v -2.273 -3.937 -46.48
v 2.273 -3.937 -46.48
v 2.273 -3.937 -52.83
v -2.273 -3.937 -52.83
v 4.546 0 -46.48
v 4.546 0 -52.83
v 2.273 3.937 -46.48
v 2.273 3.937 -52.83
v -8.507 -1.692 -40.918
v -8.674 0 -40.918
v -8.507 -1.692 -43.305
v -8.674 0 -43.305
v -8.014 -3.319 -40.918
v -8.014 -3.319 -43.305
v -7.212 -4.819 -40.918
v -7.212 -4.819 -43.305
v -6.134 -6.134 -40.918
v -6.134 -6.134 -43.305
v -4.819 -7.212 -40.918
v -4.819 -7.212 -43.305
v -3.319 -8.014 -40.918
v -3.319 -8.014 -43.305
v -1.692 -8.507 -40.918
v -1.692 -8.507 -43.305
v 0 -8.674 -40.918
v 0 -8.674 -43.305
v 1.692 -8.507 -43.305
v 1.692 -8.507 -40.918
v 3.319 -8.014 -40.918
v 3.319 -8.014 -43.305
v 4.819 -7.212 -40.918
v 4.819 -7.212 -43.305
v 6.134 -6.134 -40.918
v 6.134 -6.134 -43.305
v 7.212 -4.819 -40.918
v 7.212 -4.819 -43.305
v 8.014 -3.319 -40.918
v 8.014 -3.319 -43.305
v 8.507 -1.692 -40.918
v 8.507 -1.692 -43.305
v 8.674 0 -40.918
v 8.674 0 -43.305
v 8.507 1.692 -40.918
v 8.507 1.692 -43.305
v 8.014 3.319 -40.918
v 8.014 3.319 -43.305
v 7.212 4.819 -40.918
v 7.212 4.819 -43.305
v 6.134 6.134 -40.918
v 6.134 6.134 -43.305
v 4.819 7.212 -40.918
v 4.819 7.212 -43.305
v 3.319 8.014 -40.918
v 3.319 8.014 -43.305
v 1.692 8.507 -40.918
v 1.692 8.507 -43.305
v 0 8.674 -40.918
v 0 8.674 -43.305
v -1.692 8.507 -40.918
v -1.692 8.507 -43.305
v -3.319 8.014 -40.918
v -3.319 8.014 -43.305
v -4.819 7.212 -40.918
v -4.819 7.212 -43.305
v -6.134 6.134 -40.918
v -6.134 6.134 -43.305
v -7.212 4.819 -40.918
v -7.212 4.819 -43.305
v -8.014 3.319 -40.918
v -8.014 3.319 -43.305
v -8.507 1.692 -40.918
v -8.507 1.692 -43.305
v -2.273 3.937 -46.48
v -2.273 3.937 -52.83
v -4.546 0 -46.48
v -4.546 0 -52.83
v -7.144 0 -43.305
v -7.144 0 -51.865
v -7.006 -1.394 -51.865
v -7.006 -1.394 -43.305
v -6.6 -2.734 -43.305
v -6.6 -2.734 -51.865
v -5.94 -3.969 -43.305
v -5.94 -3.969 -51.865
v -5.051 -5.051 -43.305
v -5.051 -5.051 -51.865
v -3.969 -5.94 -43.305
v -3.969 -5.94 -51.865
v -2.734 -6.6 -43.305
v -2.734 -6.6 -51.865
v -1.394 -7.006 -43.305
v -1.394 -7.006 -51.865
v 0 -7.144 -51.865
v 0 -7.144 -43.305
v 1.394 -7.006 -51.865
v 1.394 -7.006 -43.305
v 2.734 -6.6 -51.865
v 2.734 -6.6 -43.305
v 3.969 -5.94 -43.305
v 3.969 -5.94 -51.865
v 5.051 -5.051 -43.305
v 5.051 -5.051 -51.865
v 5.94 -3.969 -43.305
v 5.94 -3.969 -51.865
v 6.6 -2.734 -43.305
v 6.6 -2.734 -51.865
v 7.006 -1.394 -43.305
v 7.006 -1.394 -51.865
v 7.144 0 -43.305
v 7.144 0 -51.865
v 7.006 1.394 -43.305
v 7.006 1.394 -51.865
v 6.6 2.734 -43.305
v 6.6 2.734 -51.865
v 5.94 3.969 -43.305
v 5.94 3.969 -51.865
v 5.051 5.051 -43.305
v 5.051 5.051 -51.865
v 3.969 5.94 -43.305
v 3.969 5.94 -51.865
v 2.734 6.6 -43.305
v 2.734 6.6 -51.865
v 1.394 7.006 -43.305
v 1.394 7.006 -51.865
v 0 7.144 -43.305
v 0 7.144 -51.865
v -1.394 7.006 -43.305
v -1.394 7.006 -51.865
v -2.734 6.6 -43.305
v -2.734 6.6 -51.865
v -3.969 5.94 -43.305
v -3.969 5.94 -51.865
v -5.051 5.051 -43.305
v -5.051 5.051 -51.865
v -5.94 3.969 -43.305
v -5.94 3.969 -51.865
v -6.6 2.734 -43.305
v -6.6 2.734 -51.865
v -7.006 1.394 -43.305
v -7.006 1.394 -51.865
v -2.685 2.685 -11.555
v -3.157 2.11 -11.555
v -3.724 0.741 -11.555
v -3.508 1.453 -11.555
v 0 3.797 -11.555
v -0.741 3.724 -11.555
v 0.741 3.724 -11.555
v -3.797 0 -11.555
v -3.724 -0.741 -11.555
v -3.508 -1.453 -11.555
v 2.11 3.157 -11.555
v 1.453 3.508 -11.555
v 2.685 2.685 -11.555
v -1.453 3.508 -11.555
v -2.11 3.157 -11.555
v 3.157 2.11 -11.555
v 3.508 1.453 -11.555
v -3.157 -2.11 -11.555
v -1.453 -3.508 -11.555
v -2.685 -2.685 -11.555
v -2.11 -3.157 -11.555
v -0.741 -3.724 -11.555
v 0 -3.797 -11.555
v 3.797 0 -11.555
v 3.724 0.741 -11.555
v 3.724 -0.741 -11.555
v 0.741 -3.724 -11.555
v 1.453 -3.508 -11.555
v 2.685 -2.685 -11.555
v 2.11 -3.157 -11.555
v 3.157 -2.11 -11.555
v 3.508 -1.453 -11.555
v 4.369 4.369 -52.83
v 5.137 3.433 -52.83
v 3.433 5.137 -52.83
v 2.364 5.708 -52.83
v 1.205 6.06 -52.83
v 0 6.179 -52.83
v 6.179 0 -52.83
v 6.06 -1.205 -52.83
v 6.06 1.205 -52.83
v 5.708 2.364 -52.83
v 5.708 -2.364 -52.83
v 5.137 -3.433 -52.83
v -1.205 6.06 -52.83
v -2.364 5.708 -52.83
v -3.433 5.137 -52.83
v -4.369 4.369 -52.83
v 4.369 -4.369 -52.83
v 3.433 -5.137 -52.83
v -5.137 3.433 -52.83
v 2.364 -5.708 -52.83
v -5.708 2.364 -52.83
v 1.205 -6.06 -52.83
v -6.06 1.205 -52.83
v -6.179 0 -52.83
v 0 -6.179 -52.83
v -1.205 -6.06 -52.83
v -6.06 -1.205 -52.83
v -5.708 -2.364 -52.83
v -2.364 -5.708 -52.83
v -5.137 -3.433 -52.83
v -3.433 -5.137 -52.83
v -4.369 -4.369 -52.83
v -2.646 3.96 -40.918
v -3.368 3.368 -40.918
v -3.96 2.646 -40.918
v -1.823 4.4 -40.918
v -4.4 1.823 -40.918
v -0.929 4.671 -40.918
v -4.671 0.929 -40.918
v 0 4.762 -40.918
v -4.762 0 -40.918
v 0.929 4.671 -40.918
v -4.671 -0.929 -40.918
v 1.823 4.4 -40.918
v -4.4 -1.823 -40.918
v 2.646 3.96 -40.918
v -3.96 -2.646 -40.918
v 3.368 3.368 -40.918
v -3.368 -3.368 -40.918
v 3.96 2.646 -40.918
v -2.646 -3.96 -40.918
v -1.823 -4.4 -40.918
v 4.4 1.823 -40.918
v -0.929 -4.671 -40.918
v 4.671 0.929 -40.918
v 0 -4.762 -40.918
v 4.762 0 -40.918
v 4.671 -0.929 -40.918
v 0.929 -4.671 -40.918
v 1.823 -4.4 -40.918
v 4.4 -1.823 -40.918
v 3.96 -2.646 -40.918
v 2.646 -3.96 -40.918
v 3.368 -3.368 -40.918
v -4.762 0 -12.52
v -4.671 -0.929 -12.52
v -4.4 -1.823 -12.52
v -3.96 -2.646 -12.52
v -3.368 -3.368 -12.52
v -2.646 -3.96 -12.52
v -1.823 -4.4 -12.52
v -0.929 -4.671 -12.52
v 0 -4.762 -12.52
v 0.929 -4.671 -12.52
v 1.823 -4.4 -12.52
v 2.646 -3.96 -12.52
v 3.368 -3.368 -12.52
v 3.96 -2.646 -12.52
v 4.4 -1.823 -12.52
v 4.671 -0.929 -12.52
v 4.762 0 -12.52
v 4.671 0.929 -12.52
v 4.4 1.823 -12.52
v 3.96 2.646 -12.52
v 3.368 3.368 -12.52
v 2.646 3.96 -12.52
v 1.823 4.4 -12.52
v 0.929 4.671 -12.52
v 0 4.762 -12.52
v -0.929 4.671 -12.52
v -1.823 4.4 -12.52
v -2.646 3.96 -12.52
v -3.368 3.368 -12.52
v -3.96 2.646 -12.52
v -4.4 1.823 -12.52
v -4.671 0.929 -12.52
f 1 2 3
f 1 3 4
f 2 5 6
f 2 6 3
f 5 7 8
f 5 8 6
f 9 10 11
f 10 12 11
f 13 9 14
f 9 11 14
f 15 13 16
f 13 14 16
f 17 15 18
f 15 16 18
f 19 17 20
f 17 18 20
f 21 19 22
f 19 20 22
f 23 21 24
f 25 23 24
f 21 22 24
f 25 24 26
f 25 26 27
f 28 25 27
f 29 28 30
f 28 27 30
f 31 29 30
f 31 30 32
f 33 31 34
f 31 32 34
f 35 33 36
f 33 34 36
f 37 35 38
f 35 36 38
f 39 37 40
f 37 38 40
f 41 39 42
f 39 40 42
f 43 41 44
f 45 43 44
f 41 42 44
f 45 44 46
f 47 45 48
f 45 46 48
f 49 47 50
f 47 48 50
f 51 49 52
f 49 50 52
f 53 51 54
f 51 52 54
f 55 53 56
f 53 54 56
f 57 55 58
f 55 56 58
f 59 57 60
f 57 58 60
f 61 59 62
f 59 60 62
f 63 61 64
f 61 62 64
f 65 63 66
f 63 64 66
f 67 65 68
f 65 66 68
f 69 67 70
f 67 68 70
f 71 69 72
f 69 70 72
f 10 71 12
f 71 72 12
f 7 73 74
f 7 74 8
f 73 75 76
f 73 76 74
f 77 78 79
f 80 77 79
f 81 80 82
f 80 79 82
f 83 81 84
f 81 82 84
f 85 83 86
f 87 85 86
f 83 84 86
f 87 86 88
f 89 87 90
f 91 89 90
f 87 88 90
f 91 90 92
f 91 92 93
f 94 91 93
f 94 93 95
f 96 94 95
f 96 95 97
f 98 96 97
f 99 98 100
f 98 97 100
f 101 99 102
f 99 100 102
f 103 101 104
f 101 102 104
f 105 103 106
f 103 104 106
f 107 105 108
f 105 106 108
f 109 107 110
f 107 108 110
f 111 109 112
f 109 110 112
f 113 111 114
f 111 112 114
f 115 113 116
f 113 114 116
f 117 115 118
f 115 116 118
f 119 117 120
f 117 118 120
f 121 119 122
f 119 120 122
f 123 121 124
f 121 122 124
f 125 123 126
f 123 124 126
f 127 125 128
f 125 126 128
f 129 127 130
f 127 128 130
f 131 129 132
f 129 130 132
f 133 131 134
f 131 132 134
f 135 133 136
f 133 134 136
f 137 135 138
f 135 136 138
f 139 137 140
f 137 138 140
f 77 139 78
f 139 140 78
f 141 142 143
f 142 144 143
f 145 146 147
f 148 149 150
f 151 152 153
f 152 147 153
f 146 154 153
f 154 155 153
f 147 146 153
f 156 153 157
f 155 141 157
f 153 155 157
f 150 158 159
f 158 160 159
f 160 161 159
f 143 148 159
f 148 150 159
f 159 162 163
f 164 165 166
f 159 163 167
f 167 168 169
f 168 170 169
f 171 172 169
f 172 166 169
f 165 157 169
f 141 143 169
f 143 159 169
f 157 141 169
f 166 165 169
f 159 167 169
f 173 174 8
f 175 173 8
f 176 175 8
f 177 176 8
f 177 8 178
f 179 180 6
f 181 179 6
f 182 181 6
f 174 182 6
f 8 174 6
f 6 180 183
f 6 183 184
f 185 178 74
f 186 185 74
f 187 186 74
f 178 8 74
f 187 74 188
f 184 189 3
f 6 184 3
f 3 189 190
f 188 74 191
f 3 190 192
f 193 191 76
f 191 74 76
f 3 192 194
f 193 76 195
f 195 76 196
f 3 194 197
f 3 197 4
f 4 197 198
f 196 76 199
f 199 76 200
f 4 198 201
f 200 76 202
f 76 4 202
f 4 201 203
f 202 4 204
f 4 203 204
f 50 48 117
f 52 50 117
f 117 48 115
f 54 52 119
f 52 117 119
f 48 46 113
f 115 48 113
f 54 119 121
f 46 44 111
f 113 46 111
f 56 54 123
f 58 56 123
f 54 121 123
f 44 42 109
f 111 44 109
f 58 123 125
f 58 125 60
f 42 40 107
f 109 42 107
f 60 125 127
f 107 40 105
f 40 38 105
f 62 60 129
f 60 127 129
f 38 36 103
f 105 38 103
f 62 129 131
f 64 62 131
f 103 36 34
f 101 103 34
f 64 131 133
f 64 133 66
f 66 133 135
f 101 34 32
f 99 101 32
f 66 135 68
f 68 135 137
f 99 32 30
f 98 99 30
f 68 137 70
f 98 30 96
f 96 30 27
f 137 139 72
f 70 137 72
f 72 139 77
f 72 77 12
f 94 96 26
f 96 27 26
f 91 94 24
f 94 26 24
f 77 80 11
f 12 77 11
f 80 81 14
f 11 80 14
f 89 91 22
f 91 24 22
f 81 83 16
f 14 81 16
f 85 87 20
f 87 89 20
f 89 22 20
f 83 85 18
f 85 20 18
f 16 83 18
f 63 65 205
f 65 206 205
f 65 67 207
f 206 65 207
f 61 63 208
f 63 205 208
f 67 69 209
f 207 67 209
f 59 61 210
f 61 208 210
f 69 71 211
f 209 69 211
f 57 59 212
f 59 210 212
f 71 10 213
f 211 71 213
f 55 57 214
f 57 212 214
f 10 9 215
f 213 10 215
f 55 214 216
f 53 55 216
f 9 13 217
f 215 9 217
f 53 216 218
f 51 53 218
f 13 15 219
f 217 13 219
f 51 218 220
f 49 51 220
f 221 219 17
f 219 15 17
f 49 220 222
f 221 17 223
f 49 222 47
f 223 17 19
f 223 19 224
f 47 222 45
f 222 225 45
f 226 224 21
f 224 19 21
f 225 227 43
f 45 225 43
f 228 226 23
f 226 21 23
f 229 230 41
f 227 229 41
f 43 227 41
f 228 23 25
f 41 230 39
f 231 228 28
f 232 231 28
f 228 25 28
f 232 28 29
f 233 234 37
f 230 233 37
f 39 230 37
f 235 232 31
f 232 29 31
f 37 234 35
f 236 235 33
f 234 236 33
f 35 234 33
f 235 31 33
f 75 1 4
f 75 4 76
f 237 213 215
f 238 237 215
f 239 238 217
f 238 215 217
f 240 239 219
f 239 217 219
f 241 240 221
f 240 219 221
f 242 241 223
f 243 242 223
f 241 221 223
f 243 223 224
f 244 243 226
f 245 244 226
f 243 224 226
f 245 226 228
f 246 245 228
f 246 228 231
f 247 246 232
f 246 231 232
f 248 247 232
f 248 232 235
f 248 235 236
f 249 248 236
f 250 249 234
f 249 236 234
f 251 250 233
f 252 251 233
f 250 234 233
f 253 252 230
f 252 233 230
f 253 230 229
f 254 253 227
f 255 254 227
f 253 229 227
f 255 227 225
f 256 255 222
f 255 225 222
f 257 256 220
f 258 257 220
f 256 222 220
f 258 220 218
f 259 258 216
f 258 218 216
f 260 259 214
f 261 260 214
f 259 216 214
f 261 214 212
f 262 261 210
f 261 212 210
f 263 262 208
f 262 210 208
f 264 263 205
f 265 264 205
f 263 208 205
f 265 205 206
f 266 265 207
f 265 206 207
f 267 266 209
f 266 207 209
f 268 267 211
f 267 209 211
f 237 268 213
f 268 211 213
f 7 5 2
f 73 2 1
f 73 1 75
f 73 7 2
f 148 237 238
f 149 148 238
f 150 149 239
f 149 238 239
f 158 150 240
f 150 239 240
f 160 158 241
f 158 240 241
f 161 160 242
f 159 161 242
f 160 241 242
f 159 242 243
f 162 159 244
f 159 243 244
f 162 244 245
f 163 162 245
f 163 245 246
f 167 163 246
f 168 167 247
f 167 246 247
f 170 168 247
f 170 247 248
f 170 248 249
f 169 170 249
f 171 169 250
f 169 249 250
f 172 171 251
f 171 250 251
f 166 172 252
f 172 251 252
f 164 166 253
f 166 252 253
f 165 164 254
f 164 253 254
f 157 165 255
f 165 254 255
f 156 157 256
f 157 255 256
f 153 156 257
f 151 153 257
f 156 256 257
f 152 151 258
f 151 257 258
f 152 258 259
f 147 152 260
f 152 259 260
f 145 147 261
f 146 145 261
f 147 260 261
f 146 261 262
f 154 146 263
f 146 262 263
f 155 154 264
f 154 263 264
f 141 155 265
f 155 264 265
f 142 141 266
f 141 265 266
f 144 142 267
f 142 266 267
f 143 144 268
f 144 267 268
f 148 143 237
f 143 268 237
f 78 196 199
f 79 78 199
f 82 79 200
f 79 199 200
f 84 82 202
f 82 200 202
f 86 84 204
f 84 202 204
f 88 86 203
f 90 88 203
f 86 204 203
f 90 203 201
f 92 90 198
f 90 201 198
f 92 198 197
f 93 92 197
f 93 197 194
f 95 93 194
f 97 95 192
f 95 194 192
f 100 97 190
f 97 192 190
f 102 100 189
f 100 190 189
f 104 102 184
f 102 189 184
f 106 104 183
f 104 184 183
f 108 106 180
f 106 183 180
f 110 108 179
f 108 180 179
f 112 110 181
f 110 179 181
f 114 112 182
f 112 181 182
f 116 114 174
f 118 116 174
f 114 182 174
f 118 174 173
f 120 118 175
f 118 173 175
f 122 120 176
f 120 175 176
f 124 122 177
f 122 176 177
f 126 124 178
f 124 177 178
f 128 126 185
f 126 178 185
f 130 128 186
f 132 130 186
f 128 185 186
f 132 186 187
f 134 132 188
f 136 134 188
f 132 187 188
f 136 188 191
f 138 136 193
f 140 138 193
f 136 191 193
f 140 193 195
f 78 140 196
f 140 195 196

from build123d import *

# Parameters (mm, degrees)
CUT_EXTRUDE1_DEPTH = 6.35
CHAMFER1_SIZE      = 0.9652
CHAMFER2_SIZE      = 0.9652


with BuildPart() as part:
    # Sketch1 → Revolve1 (revolve)
    with BuildSketch(Plane(origin=(0, 0, 0), x_dir=(1, 0, 0), z_dir=(0, 1, 0))):
        Polygon((0, 52.830247514), (0, 11.555247514), (-4.7625, 11.555247514), (-4.7625, 40.917647514), (-8.6741, 40.917647514), (-8.6741, 43.305247514), (-7.14375, 43.305247514), (-7.14375, 52.830247514), align=None)
    revolve(axis=Axis((0, 0, -86.603340611), (0, 0, 1)))

    # Sketch2 → Cut-Extrude1 (cut)
    with BuildSketch(Plane(origin=(0, 0, -52.830247514), x_dir=(-1, 0, 0), z_dir=(0, 0, -1))):
        Polygon((2.27302801, 3.937), (-2.27302801, 3.937), (-4.54605602, 0), (-2.27302801, -3.937), (2.27302801, -3.937), (4.54605602, 0), align=None)
    extrude(amount=-CUT_EXTRUDE1_DEPTH, mode=Mode.SUBTRACT)

    # Chamfer1
    chamfer1_edges = [part.edges().sort_by_distance(p)[0] for p in [
        (4.7625, 0, -11.555247514),
    ]]
    chamfer(chamfer1_edges, length=CHAMFER1_SIZE)

    # Chamfer2
    chamfer2_edges = [part.edges().sort_by_distance(p)[0] for p in [
        (7.14375, 0, -52.830247514),
    ]]
    chamfer(chamfer2_edges, length=CHAMFER2_SIZE)


solid = part.part
